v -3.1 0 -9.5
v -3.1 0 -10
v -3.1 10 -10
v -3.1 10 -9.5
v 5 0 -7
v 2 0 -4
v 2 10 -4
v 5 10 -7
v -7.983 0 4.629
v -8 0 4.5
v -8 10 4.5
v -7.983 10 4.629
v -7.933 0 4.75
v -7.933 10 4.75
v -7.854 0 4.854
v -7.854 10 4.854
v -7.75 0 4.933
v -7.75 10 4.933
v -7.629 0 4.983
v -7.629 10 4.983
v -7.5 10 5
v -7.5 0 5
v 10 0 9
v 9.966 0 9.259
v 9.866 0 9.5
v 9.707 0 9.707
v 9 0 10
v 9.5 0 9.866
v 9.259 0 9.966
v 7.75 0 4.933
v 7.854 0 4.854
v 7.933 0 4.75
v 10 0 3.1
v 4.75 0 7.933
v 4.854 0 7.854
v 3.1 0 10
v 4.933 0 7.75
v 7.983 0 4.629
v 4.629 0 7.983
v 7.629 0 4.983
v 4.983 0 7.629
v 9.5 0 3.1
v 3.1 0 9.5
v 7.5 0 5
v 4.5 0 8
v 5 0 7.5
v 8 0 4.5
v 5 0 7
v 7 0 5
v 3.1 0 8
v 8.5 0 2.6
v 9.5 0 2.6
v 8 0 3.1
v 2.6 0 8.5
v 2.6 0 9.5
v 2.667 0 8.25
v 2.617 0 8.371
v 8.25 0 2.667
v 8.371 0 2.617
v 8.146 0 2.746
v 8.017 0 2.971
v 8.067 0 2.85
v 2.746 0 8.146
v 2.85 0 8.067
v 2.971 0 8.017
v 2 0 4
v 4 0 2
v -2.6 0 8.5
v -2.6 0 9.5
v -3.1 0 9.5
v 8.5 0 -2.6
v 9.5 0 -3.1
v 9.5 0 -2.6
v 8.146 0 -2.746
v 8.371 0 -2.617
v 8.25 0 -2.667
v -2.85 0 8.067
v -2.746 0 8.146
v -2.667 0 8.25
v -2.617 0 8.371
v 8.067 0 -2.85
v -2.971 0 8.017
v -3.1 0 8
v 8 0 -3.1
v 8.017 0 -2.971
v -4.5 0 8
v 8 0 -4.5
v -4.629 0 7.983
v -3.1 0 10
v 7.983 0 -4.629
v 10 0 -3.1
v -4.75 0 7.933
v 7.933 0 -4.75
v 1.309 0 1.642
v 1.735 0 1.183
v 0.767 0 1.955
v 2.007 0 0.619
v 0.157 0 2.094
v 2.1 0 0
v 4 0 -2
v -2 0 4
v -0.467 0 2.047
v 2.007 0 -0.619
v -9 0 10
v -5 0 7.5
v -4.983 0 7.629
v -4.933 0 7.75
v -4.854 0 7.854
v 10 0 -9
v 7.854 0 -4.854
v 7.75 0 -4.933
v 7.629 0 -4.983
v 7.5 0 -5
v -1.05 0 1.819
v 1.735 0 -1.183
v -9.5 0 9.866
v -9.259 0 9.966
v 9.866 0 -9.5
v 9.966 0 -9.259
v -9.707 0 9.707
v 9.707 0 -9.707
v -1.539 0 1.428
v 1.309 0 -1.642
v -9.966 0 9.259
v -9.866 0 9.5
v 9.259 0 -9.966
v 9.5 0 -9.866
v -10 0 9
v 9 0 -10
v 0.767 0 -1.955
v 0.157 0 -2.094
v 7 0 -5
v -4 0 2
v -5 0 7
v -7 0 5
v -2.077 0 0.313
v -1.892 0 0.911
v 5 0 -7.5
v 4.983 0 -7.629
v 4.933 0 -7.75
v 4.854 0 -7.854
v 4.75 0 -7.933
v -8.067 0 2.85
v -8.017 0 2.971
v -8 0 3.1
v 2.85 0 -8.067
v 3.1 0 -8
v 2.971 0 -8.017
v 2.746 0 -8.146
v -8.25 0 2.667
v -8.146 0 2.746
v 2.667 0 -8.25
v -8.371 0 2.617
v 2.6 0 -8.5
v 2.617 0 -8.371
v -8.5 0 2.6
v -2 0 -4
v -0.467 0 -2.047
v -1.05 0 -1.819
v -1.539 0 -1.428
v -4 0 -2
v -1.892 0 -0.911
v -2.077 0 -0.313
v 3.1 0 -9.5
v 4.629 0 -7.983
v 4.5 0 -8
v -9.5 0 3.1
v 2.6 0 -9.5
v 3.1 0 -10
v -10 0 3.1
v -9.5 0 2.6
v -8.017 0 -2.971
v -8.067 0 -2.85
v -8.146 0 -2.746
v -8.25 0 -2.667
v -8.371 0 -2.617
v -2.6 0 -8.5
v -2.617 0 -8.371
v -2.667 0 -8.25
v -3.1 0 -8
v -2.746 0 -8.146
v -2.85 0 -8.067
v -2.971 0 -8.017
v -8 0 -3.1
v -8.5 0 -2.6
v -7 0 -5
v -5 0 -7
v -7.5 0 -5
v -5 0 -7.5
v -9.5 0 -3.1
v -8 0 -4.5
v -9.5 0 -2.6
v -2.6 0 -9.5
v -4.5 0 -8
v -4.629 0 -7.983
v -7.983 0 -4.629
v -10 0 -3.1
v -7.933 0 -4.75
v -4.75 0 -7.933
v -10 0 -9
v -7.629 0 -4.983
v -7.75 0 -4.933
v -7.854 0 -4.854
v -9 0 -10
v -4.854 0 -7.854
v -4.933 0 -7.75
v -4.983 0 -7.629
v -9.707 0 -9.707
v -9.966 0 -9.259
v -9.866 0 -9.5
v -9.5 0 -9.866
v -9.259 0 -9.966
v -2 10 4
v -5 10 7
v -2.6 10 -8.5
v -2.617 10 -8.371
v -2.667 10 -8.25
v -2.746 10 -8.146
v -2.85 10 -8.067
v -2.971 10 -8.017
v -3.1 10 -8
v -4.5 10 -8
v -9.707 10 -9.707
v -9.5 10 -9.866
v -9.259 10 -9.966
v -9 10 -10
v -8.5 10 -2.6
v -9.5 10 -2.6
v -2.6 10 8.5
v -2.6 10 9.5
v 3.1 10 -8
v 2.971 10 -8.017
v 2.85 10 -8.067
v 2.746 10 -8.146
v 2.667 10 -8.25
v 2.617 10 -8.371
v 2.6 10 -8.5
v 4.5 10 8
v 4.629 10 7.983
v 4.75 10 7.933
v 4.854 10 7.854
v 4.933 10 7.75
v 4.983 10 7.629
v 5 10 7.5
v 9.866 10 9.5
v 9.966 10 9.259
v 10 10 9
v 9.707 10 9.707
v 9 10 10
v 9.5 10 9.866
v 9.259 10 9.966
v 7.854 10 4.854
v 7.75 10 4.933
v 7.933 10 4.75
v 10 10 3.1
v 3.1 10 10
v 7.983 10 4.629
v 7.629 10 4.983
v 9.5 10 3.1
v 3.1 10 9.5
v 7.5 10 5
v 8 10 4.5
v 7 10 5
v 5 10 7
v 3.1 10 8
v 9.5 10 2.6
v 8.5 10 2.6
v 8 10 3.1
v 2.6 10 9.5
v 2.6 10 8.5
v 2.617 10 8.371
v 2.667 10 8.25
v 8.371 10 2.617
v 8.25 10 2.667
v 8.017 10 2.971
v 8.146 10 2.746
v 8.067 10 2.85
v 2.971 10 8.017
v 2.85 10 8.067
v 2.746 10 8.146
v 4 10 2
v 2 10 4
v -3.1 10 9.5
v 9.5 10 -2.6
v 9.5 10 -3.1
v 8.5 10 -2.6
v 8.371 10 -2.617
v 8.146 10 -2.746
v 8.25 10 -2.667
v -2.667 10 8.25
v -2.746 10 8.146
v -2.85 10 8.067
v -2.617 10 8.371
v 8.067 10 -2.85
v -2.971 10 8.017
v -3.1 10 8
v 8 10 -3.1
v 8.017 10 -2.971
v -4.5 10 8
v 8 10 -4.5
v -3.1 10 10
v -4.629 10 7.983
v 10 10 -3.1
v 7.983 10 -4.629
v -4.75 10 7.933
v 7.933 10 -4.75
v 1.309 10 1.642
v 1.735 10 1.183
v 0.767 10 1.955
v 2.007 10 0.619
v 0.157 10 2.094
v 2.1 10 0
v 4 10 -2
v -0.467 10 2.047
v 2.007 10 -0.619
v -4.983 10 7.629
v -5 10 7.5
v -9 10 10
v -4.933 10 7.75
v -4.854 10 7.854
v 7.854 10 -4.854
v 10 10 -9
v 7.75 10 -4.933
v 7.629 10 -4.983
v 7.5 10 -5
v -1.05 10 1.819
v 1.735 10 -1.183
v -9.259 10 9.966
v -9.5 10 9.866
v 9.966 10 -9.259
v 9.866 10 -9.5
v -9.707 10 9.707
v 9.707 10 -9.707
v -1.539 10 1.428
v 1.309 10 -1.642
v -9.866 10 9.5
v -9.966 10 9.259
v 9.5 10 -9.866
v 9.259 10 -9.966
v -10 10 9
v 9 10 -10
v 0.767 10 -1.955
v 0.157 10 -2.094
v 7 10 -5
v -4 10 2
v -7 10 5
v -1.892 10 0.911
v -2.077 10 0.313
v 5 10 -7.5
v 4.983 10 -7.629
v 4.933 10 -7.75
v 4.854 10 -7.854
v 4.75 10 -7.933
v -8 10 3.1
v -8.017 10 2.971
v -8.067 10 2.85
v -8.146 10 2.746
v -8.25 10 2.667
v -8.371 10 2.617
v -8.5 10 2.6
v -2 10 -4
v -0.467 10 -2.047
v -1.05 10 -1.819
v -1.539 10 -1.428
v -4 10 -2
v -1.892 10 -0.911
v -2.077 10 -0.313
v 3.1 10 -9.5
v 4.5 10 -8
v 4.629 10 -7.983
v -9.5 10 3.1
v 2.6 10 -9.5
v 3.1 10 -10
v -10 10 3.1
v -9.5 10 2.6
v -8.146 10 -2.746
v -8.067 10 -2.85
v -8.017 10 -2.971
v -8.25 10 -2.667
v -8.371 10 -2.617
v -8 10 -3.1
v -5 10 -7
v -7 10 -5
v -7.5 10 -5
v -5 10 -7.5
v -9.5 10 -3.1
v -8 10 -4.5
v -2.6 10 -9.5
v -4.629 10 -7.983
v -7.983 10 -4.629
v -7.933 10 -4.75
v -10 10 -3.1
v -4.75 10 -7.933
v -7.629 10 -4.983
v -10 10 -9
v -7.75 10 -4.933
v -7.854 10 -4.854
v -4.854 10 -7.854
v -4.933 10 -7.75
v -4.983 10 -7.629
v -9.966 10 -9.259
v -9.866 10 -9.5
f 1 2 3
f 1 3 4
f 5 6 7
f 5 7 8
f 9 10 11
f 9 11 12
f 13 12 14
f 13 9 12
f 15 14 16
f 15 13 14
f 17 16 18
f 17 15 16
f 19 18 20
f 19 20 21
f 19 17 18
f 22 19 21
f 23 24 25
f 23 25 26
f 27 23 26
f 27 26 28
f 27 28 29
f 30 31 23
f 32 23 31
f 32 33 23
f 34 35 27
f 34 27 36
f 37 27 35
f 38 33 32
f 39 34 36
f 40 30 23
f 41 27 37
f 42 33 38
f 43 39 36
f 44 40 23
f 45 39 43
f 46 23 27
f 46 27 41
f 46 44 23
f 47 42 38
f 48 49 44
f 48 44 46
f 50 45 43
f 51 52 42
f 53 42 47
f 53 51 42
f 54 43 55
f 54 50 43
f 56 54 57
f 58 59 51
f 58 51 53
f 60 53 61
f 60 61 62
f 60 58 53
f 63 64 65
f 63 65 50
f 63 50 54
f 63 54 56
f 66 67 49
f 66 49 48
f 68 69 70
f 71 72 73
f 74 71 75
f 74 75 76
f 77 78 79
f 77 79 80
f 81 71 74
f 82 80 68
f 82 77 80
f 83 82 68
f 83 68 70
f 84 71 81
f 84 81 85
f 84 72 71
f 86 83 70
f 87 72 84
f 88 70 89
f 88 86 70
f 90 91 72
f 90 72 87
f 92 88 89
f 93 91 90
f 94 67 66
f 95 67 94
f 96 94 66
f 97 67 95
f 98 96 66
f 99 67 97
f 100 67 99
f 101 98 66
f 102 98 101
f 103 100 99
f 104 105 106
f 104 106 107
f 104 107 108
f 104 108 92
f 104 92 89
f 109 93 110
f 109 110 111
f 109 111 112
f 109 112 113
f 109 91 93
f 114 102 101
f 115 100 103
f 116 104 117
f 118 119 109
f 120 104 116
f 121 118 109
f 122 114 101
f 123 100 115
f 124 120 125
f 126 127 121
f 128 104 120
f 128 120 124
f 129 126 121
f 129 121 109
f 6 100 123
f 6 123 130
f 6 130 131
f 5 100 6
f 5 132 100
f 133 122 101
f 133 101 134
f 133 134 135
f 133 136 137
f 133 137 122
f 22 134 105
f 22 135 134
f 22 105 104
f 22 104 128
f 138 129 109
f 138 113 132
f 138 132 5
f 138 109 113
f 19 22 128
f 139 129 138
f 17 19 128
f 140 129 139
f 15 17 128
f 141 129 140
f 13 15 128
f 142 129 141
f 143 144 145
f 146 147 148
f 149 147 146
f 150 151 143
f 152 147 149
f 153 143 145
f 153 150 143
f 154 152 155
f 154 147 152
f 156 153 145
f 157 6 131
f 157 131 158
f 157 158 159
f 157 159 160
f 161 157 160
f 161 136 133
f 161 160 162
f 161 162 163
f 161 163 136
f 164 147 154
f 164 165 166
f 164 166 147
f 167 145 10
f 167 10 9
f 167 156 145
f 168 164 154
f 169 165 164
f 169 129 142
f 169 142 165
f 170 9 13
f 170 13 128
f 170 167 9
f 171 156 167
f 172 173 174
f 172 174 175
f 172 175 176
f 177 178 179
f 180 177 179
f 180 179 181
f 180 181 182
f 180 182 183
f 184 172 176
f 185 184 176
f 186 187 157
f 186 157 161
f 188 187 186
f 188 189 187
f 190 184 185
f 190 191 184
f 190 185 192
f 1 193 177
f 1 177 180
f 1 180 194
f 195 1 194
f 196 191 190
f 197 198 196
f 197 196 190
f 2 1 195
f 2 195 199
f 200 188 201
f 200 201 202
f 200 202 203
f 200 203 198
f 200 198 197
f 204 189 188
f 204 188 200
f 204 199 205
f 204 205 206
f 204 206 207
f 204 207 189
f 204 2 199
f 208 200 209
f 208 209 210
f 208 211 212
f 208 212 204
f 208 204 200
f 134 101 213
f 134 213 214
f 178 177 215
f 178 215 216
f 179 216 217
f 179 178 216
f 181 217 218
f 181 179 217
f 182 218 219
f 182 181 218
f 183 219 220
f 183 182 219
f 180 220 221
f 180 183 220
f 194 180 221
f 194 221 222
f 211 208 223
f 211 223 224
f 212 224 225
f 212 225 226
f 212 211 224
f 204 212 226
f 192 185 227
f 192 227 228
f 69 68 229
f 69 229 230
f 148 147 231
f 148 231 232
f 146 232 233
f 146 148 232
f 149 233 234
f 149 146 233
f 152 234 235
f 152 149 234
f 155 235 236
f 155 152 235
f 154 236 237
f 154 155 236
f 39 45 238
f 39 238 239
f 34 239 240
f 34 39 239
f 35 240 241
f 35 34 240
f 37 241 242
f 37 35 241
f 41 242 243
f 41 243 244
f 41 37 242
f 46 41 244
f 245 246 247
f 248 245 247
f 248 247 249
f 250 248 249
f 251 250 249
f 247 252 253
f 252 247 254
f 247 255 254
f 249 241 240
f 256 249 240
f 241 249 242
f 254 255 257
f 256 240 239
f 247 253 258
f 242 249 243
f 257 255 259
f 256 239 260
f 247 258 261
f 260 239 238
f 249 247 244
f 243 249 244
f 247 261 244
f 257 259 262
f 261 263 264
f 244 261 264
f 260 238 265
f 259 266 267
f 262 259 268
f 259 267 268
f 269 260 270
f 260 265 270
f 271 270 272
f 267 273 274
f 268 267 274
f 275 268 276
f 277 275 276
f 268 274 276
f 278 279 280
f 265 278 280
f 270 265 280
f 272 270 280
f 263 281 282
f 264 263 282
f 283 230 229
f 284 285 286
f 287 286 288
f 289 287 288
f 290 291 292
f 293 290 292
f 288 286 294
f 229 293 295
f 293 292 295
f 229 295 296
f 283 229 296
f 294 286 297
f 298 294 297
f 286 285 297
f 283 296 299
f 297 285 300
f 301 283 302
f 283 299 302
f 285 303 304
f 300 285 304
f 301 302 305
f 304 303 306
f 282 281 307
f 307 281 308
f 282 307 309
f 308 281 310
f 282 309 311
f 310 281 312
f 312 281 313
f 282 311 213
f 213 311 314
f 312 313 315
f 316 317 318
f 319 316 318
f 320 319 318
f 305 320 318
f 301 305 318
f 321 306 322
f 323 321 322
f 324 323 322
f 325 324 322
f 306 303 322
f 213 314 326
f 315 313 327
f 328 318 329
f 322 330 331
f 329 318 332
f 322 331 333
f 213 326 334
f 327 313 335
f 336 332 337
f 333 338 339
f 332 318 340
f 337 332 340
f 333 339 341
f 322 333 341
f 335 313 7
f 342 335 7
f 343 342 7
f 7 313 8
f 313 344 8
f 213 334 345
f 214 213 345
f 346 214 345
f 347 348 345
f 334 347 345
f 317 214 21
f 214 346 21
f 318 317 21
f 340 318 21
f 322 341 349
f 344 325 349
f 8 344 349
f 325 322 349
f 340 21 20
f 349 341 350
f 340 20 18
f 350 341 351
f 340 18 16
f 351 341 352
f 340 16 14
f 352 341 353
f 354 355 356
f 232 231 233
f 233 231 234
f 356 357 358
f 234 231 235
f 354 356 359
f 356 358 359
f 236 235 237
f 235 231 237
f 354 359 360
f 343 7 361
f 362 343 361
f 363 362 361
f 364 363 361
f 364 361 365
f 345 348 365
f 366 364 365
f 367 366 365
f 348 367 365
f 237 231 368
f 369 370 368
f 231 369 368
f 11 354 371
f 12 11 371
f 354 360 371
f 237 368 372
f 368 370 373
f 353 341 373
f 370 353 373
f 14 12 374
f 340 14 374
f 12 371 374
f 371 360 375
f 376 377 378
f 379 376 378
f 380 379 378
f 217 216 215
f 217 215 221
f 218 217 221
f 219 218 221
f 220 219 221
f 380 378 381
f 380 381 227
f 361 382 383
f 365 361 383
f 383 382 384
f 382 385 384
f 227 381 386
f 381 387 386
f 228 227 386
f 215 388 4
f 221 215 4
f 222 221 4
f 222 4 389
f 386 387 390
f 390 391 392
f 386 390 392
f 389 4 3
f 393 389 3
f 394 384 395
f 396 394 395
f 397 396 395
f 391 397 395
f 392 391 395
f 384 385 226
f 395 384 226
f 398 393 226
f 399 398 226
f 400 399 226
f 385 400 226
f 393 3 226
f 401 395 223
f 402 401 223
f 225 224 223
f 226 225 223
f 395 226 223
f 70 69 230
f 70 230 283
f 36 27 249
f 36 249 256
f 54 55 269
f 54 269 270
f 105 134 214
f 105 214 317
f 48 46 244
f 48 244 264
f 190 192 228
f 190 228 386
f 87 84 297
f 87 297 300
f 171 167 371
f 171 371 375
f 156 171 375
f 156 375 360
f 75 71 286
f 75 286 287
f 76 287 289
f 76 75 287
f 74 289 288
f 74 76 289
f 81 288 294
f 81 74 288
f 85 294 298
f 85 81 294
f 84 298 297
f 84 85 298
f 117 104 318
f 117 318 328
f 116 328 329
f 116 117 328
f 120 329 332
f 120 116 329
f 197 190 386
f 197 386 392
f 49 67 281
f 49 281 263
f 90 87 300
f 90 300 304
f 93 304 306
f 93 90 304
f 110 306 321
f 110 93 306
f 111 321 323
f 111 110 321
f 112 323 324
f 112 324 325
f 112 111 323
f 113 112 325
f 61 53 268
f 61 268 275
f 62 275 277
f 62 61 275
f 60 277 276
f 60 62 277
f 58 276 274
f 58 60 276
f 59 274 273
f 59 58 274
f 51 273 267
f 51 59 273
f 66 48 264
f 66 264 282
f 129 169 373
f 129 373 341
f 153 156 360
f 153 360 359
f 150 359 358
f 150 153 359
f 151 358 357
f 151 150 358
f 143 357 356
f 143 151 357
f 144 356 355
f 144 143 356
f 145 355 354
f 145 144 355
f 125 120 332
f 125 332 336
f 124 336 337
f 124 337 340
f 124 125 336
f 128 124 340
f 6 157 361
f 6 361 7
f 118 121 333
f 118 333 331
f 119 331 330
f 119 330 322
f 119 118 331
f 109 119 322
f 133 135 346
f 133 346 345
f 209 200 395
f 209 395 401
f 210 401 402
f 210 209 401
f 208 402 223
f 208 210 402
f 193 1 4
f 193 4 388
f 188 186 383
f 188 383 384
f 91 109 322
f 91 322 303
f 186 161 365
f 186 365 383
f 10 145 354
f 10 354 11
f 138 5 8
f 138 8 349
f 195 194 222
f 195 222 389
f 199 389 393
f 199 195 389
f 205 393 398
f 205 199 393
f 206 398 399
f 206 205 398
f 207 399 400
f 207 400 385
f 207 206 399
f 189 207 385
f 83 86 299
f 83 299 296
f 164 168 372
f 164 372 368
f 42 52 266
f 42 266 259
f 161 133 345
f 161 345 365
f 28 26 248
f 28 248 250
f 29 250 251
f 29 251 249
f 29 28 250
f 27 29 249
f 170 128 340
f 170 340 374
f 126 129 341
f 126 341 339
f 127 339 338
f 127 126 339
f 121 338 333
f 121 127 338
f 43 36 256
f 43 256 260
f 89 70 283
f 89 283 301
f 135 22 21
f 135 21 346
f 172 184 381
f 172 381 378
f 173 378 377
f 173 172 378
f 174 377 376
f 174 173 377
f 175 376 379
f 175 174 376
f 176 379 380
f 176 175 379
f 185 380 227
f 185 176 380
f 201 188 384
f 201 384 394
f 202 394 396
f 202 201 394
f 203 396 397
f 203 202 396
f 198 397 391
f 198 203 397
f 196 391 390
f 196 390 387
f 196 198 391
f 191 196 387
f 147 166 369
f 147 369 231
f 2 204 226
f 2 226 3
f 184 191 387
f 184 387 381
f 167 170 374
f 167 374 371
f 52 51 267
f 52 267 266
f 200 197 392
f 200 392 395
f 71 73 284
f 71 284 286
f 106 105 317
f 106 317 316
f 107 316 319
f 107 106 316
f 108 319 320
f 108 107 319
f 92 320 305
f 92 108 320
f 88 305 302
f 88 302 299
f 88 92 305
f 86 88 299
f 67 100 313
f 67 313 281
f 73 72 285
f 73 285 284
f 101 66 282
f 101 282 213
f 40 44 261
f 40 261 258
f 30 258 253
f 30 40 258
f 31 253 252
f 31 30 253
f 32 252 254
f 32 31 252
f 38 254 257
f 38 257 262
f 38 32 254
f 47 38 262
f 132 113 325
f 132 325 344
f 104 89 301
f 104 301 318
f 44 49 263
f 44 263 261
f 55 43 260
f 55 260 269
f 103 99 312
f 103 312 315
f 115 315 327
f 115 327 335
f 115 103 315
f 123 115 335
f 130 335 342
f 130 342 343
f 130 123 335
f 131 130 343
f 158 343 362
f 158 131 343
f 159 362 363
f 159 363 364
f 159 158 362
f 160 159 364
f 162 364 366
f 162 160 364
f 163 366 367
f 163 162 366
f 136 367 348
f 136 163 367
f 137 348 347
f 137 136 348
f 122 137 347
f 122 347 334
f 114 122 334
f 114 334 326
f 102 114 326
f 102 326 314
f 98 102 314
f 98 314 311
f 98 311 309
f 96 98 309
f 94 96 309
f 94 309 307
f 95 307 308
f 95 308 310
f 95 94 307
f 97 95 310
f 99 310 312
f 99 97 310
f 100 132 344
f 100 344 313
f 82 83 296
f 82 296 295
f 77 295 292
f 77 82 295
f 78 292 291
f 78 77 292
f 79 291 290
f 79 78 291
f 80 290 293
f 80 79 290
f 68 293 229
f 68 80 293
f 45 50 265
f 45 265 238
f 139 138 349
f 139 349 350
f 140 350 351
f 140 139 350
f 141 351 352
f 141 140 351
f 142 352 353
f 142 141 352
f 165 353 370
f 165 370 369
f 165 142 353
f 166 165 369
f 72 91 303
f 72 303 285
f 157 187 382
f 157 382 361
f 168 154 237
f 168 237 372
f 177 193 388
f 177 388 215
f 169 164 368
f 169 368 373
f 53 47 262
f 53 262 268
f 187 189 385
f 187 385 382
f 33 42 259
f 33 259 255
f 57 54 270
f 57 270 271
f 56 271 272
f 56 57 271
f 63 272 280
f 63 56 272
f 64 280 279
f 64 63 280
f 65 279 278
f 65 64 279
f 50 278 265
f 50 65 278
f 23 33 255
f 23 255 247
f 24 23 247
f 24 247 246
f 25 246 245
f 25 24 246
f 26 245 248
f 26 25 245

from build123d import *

# Parameters (mm, degrees)
SKETCH_1_R      = 2.1
EXTRUDE_1_DEPTH = 10


with BuildPart() as part:
    # 스케치1 → 보스-돌출1 (new body)
    with BuildSketch(Plane(origin=(0, 0, 0), x_dir=(1, 0, 0), z_dir=(0, 1, 0))):
        with BuildLine():
            Line((2, -4), (-2, -4))
            Line((-2, -4), (-5, -7))
            Line((-5, -7), (-5, -7.5))
            ThreePointArc((-5, -7.5), (-4.853553391, -7.853553391), (-4.5, -8))
            Line((-4.5, -8), (-3.1, -8))
            ThreePointArc((-3.1, -8), (-2.746446609, -8.146446609), (-2.6, -8.5))
            Line((-2.6, -8.5), (-2.6, -9.5))
            Line((-2.6, -9.5), (-3.1, -9.5))
            Line((-3.1, -9.5), (-3.1, -10))
            Line((-3.1, -10), (-9, -10))
            ThreePointArc((-9, -10), (-9.382683432, -9.923879533), (-9.707106781, -9.707106781))
            ThreePointArc((-9.707106781, -9.707106781), (-9.923879533, -9.382683432), (-10, -9))
            Line((-10, -9), (-10, -3.1))
            Line((-10, -3.1), (-9.5, -3.1))
            Line((-9.5, -3.1), (-9.5, -2.6))
            Line((-9.5, -2.6), (-8.5, -2.6))
            ThreePointArc((-8.5, -2.6), (-8.146446609, -2.746446609), (-8, -3.1))
            Line((-8, -3.1), (-8, -4.5))
            ThreePointArc((-8, -4.5), (-7.853553391, -4.853553391), (-7.5, -5))
            Line((-7.5, -5), (-7, -5))
            Line((-7, -5), (-4, -2))
            Line((-4, -2), (-4, 2))
            Line((-4, 2), (-7, 5))
            Line((-7, 5), (-7.5, 5))
            ThreePointArc((-7.5, 5), (-7.853553391, 4.853553391), (-8, 4.5))
            Line((-8, 4.5), (-8, 3.1))
            ThreePointArc((-8, 3.1), (-8.146446609, 2.746446609), (-8.5, 2.6))
            Line((-8.5, 2.6), (-9.5, 2.6))
            Line((-9.5, 2.6), (-9.5, 3.1))
            Line((-9.5, 3.1), (-10, 3.1))
            Line((-10, 3.1), (-10, 9))
            ThreePointArc((-10, 9), (-9.923879533, 9.382683432), (-9.707106781, 9.707106781))
            ThreePointArc((-9.707106781, 9.707106781), (-9.382683432, 9.923879533), (-9, 10))
            Line((-9, 10), (-3.1, 10))
            Line((-3.1, 10), (-3.1, 9.5))
            Line((-3.1, 9.5), (-2.6, 9.5))
            Line((-2.6, 9.5), (-2.6, 8.5))
            ThreePointArc((-2.6, 8.5), (-2.746446609, 8.146446609), (-3.1, 8))
            Line((-3.1, 8), (-4.5, 8))
            ThreePointArc((-4.5, 8), (-4.853553391, 7.853553391), (-5, 7.5))
            Line((-5, 7.5), (-5, 7))
            Line((-5, 7), (-2, 4))
            Line((-2, 4), (2, 4))
            Line((2, 4), (5, 7))
            Line((5, 7), (5, 7.5))
            ThreePointArc((5, 7.5), (4.853553391, 7.853553391), (4.5, 8))
            Line((4.5, 8), (3.1, 8))
            ThreePointArc((3.1, 8), (2.746446609, 8.146446609), (2.6, 8.5))
            Line((2.6, 8.5), (2.6, 9.5))
            Line((2.6, 9.5), (3.1, 9.5))
            Line((3.1, 9.5), (3.1, 10))
            Line((3.1, 10), (9, 10))
            ThreePointArc((9, 10), (9.382683432, 9.923879533), (9.707106781, 9.707106781))
            ThreePointArc((9.707106781, 9.707106781), (9.923879533, 9.382683432), (10, 9))
            Line((10, 9), (10, 3.1))
            Line((10, 3.1), (9.5, 3.1))
            Line((9.5, 3.1), (9.5, 2.6))
            Line((9.5, 2.6), (8.5, 2.6))
            ThreePointArc((8.5, 2.6), (8.146446609, 2.746446609), (8, 3.1))
            Line((8, 3.1), (8, 4.5))
            ThreePointArc((8, 4.5), (7.853553391, 4.853553391), (7.5, 5))
            Line((7.5, 5), (7, 5))
            Line((7, 5), (4, 2))
            Line((4, 2), (4, -2))
            Line((4, -2), (7, -5))
            Line((7, -5), (7.5, -5))
            ThreePointArc((7.5, -5), (7.853553391, -4.853553391), (8, -4.5))
            Line((8, -4.5), (8, -3.1))
            ThreePointArc((8, -3.1), (8.146446609, -2.746446609), (8.5, -2.6))
            Line((8.5, -2.6), (9.5, -2.6))
            Line((9.5, -2.6), (9.5, -3.1))
            Line((9.5, -3.1), (10, -3.1))
            Line((10, -3.1), (10, -9))
            ThreePointArc((10, -9), (9.923879533, -9.382683432), (9.707106781, -9.707106781))
            ThreePointArc((9.707106781, -9.707106781), (9.382683432, -9.923879533), (9, -10))
            Line((9, -10), (3.1, -10))
            Line((3.1, -10), (3.1, -9.5))
            Line((3.1, -9.5), (2.6, -9.5))
            Line((2.6, -9.5), (2.6, -8.5))
            ThreePointArc((2.6, -8.5), (2.746446609, -8.146446609), (3.1, -8))
            Line((3.1, -8), (4.5, -8))
            ThreePointArc((4.5, -8), (4.853553391, -7.853553391), (5, -7.5))
            Line((5, -7.5), (5, -7))
            Line((5, -7), (2, -4))
        make_face()
        Circle(SKETCH_1_R, mode=Mode.SUBTRACT)
    extrude(amount=EXTRUDE_1_DEPTH)


solid = part.part
